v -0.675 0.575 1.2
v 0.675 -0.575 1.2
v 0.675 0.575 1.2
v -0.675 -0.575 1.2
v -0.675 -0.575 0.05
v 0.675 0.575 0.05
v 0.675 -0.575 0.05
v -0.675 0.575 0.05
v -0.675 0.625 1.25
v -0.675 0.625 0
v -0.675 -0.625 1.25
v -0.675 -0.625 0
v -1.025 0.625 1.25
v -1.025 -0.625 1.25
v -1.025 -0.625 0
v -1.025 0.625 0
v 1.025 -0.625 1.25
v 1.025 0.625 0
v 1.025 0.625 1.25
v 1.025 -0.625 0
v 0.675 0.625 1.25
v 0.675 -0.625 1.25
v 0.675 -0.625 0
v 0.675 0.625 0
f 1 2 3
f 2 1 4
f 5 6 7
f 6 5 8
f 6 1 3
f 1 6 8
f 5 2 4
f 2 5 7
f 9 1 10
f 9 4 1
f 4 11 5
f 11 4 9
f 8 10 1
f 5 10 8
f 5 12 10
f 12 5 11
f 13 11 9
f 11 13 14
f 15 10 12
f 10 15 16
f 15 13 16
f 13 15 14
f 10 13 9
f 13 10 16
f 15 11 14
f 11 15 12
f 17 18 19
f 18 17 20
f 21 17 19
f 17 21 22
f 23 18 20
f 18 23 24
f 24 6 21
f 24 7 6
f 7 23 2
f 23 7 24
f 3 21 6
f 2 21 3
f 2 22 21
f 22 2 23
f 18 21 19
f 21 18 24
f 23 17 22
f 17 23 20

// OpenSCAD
// file: proto/chip-c.scad
/*
OpenSCAD Model:  chip capacitor

  L  - body length
  T  - pad length
  W  - width
  H  - height
  padcolor - color of metal leads
  bodycolor - color of body
  simple - 0 = realistic model, 1 = simplified model
*/

module chip_c(
	L=2.00,
	T=0.50,
	W=1.25,
	H=1.20,
	padcolor=[0.9,0.9,0.9],
	bodycolor=[0.722,0.541,0.0],
	simple=1
) {

	module chippad() {
		if (simple) {
			color(padcolor)cube([T,W,H],center=true);
		} else {
			color(padcolor) union () {
				cube([T-0.1,W-0.1,H    ],center=true);
				cube([T-0.1,W    ,H-0.1],center=true);
				cube([T    ,W-0.1,H-0.1],center=true);
				translate([-T/2+0.05,-W/2+0.05,0]) cylinder(r=0.05,h=H-0.1,$fn=30,center=true);
				translate([T/2-0.05,-W/2+0.05,0]) cylinder(r=0.05,h=H-0.1,$fn=30,center=true);
				translate([-T/2+0.05,W/2-0.05,0]) cylinder(r=0.05,h=H-0.1,$fn=30,center=true);
				translate([T/2-0.05,W/2-0.05,0]) cylinder(r=0.05,h=H-0.1,$fn=30,center=true);
				translate([-T/2+0.05,0,H/2-0.05]) rotate(90,[1,0,0])cylinder(r=0.05,h=W-0.1,$fn=30,center=true);
				translate([T/2-0.05,0,H/2-0.05]) rotate(90,[1,0,0])cylinder(r=0.05,h=W-0.1,$fn=30,center=true);
				translate([-T/2+0.05,0,-H/2+0.05]) rotate(90,[1,0,0])cylinder(r=0.05,h=W-0.1,$fn=30,center=true);
				translate([T/2-0.05,0,-H/2+0.05]) rotate(90,[1,0,0])cylinder(r=0.05,h=W-0.1,$fn=30,center=true);
				translate([0,-W/2+0.05,H/2-0.05]) rotate(90,[0,1,0])cylinder(r=0.05,h=T-0.1,$fn=30,center=true);
				translate([0,W/2-0.05,H/2-0.05]) rotate(90,[0,1,0])cylinder(r=0.05,h=T-0.1,$fn=30,center=true);
				translate([0,-W/2+0.05,-H/2+0.05]) rotate(90,[0,1,0])cylinder(r=0.05,h=T-0.1,$fn=30,center=true);
				translate([0,W/2-0.05,-H/2+0.05]) rotate(90,[0,1,0])cylinder(r=0.05,h=T-0.1,$fn=30,center=true);
				translate([-T/2+0.05,-W/2+0.05,-H/2+0.05]) sphere(r=0.05, $fn=30);
				translate([-T/2+0.05,-W/2+0.05,H/2-0.05]) sphere(r=0.05, $fn=30);
				translate([T/2-0.05,-W/2+0.05,-H/2+0.05]) sphere(r=0.05, $fn=30);
				translate([T/2-0.05,-W/2+0.05,H/2-0.05]) sphere(r=0.05, $fn=30);
				translate([-T/2+0.05,W/2-0.05,-H/2+0.05]) sphere(r=0.05, $fn=30);
				translate([-T/2+0.05,W/2-0.05,H/2-0.05]) sphere(r=0.05, $fn=30);
				translate([T/2-0.05,W/2-0.05,-H/2+0.05]) sphere(r=0.05, $fn=30);
				translate([T/2-0.05,W/2-0.05,H/2-0.05]) sphere(r=0.05, $fn=30);
			}
		}
	}
	color(bodycolor) translate([0,0,H/2.]) cube([L-2*T+0.1,W-0.1,H-0.1],center=true);
	translate ([-L/2.+T/2.,0,H/2.]) chippad();
	translate ([L/2.-T/2.,0,H/2.]) chippad();
}
// main file
include<proto/chip-c.scad>

chip_c (
	L=2.05,
	T=0.35,
	W=1.25,
	H=1.25
);
